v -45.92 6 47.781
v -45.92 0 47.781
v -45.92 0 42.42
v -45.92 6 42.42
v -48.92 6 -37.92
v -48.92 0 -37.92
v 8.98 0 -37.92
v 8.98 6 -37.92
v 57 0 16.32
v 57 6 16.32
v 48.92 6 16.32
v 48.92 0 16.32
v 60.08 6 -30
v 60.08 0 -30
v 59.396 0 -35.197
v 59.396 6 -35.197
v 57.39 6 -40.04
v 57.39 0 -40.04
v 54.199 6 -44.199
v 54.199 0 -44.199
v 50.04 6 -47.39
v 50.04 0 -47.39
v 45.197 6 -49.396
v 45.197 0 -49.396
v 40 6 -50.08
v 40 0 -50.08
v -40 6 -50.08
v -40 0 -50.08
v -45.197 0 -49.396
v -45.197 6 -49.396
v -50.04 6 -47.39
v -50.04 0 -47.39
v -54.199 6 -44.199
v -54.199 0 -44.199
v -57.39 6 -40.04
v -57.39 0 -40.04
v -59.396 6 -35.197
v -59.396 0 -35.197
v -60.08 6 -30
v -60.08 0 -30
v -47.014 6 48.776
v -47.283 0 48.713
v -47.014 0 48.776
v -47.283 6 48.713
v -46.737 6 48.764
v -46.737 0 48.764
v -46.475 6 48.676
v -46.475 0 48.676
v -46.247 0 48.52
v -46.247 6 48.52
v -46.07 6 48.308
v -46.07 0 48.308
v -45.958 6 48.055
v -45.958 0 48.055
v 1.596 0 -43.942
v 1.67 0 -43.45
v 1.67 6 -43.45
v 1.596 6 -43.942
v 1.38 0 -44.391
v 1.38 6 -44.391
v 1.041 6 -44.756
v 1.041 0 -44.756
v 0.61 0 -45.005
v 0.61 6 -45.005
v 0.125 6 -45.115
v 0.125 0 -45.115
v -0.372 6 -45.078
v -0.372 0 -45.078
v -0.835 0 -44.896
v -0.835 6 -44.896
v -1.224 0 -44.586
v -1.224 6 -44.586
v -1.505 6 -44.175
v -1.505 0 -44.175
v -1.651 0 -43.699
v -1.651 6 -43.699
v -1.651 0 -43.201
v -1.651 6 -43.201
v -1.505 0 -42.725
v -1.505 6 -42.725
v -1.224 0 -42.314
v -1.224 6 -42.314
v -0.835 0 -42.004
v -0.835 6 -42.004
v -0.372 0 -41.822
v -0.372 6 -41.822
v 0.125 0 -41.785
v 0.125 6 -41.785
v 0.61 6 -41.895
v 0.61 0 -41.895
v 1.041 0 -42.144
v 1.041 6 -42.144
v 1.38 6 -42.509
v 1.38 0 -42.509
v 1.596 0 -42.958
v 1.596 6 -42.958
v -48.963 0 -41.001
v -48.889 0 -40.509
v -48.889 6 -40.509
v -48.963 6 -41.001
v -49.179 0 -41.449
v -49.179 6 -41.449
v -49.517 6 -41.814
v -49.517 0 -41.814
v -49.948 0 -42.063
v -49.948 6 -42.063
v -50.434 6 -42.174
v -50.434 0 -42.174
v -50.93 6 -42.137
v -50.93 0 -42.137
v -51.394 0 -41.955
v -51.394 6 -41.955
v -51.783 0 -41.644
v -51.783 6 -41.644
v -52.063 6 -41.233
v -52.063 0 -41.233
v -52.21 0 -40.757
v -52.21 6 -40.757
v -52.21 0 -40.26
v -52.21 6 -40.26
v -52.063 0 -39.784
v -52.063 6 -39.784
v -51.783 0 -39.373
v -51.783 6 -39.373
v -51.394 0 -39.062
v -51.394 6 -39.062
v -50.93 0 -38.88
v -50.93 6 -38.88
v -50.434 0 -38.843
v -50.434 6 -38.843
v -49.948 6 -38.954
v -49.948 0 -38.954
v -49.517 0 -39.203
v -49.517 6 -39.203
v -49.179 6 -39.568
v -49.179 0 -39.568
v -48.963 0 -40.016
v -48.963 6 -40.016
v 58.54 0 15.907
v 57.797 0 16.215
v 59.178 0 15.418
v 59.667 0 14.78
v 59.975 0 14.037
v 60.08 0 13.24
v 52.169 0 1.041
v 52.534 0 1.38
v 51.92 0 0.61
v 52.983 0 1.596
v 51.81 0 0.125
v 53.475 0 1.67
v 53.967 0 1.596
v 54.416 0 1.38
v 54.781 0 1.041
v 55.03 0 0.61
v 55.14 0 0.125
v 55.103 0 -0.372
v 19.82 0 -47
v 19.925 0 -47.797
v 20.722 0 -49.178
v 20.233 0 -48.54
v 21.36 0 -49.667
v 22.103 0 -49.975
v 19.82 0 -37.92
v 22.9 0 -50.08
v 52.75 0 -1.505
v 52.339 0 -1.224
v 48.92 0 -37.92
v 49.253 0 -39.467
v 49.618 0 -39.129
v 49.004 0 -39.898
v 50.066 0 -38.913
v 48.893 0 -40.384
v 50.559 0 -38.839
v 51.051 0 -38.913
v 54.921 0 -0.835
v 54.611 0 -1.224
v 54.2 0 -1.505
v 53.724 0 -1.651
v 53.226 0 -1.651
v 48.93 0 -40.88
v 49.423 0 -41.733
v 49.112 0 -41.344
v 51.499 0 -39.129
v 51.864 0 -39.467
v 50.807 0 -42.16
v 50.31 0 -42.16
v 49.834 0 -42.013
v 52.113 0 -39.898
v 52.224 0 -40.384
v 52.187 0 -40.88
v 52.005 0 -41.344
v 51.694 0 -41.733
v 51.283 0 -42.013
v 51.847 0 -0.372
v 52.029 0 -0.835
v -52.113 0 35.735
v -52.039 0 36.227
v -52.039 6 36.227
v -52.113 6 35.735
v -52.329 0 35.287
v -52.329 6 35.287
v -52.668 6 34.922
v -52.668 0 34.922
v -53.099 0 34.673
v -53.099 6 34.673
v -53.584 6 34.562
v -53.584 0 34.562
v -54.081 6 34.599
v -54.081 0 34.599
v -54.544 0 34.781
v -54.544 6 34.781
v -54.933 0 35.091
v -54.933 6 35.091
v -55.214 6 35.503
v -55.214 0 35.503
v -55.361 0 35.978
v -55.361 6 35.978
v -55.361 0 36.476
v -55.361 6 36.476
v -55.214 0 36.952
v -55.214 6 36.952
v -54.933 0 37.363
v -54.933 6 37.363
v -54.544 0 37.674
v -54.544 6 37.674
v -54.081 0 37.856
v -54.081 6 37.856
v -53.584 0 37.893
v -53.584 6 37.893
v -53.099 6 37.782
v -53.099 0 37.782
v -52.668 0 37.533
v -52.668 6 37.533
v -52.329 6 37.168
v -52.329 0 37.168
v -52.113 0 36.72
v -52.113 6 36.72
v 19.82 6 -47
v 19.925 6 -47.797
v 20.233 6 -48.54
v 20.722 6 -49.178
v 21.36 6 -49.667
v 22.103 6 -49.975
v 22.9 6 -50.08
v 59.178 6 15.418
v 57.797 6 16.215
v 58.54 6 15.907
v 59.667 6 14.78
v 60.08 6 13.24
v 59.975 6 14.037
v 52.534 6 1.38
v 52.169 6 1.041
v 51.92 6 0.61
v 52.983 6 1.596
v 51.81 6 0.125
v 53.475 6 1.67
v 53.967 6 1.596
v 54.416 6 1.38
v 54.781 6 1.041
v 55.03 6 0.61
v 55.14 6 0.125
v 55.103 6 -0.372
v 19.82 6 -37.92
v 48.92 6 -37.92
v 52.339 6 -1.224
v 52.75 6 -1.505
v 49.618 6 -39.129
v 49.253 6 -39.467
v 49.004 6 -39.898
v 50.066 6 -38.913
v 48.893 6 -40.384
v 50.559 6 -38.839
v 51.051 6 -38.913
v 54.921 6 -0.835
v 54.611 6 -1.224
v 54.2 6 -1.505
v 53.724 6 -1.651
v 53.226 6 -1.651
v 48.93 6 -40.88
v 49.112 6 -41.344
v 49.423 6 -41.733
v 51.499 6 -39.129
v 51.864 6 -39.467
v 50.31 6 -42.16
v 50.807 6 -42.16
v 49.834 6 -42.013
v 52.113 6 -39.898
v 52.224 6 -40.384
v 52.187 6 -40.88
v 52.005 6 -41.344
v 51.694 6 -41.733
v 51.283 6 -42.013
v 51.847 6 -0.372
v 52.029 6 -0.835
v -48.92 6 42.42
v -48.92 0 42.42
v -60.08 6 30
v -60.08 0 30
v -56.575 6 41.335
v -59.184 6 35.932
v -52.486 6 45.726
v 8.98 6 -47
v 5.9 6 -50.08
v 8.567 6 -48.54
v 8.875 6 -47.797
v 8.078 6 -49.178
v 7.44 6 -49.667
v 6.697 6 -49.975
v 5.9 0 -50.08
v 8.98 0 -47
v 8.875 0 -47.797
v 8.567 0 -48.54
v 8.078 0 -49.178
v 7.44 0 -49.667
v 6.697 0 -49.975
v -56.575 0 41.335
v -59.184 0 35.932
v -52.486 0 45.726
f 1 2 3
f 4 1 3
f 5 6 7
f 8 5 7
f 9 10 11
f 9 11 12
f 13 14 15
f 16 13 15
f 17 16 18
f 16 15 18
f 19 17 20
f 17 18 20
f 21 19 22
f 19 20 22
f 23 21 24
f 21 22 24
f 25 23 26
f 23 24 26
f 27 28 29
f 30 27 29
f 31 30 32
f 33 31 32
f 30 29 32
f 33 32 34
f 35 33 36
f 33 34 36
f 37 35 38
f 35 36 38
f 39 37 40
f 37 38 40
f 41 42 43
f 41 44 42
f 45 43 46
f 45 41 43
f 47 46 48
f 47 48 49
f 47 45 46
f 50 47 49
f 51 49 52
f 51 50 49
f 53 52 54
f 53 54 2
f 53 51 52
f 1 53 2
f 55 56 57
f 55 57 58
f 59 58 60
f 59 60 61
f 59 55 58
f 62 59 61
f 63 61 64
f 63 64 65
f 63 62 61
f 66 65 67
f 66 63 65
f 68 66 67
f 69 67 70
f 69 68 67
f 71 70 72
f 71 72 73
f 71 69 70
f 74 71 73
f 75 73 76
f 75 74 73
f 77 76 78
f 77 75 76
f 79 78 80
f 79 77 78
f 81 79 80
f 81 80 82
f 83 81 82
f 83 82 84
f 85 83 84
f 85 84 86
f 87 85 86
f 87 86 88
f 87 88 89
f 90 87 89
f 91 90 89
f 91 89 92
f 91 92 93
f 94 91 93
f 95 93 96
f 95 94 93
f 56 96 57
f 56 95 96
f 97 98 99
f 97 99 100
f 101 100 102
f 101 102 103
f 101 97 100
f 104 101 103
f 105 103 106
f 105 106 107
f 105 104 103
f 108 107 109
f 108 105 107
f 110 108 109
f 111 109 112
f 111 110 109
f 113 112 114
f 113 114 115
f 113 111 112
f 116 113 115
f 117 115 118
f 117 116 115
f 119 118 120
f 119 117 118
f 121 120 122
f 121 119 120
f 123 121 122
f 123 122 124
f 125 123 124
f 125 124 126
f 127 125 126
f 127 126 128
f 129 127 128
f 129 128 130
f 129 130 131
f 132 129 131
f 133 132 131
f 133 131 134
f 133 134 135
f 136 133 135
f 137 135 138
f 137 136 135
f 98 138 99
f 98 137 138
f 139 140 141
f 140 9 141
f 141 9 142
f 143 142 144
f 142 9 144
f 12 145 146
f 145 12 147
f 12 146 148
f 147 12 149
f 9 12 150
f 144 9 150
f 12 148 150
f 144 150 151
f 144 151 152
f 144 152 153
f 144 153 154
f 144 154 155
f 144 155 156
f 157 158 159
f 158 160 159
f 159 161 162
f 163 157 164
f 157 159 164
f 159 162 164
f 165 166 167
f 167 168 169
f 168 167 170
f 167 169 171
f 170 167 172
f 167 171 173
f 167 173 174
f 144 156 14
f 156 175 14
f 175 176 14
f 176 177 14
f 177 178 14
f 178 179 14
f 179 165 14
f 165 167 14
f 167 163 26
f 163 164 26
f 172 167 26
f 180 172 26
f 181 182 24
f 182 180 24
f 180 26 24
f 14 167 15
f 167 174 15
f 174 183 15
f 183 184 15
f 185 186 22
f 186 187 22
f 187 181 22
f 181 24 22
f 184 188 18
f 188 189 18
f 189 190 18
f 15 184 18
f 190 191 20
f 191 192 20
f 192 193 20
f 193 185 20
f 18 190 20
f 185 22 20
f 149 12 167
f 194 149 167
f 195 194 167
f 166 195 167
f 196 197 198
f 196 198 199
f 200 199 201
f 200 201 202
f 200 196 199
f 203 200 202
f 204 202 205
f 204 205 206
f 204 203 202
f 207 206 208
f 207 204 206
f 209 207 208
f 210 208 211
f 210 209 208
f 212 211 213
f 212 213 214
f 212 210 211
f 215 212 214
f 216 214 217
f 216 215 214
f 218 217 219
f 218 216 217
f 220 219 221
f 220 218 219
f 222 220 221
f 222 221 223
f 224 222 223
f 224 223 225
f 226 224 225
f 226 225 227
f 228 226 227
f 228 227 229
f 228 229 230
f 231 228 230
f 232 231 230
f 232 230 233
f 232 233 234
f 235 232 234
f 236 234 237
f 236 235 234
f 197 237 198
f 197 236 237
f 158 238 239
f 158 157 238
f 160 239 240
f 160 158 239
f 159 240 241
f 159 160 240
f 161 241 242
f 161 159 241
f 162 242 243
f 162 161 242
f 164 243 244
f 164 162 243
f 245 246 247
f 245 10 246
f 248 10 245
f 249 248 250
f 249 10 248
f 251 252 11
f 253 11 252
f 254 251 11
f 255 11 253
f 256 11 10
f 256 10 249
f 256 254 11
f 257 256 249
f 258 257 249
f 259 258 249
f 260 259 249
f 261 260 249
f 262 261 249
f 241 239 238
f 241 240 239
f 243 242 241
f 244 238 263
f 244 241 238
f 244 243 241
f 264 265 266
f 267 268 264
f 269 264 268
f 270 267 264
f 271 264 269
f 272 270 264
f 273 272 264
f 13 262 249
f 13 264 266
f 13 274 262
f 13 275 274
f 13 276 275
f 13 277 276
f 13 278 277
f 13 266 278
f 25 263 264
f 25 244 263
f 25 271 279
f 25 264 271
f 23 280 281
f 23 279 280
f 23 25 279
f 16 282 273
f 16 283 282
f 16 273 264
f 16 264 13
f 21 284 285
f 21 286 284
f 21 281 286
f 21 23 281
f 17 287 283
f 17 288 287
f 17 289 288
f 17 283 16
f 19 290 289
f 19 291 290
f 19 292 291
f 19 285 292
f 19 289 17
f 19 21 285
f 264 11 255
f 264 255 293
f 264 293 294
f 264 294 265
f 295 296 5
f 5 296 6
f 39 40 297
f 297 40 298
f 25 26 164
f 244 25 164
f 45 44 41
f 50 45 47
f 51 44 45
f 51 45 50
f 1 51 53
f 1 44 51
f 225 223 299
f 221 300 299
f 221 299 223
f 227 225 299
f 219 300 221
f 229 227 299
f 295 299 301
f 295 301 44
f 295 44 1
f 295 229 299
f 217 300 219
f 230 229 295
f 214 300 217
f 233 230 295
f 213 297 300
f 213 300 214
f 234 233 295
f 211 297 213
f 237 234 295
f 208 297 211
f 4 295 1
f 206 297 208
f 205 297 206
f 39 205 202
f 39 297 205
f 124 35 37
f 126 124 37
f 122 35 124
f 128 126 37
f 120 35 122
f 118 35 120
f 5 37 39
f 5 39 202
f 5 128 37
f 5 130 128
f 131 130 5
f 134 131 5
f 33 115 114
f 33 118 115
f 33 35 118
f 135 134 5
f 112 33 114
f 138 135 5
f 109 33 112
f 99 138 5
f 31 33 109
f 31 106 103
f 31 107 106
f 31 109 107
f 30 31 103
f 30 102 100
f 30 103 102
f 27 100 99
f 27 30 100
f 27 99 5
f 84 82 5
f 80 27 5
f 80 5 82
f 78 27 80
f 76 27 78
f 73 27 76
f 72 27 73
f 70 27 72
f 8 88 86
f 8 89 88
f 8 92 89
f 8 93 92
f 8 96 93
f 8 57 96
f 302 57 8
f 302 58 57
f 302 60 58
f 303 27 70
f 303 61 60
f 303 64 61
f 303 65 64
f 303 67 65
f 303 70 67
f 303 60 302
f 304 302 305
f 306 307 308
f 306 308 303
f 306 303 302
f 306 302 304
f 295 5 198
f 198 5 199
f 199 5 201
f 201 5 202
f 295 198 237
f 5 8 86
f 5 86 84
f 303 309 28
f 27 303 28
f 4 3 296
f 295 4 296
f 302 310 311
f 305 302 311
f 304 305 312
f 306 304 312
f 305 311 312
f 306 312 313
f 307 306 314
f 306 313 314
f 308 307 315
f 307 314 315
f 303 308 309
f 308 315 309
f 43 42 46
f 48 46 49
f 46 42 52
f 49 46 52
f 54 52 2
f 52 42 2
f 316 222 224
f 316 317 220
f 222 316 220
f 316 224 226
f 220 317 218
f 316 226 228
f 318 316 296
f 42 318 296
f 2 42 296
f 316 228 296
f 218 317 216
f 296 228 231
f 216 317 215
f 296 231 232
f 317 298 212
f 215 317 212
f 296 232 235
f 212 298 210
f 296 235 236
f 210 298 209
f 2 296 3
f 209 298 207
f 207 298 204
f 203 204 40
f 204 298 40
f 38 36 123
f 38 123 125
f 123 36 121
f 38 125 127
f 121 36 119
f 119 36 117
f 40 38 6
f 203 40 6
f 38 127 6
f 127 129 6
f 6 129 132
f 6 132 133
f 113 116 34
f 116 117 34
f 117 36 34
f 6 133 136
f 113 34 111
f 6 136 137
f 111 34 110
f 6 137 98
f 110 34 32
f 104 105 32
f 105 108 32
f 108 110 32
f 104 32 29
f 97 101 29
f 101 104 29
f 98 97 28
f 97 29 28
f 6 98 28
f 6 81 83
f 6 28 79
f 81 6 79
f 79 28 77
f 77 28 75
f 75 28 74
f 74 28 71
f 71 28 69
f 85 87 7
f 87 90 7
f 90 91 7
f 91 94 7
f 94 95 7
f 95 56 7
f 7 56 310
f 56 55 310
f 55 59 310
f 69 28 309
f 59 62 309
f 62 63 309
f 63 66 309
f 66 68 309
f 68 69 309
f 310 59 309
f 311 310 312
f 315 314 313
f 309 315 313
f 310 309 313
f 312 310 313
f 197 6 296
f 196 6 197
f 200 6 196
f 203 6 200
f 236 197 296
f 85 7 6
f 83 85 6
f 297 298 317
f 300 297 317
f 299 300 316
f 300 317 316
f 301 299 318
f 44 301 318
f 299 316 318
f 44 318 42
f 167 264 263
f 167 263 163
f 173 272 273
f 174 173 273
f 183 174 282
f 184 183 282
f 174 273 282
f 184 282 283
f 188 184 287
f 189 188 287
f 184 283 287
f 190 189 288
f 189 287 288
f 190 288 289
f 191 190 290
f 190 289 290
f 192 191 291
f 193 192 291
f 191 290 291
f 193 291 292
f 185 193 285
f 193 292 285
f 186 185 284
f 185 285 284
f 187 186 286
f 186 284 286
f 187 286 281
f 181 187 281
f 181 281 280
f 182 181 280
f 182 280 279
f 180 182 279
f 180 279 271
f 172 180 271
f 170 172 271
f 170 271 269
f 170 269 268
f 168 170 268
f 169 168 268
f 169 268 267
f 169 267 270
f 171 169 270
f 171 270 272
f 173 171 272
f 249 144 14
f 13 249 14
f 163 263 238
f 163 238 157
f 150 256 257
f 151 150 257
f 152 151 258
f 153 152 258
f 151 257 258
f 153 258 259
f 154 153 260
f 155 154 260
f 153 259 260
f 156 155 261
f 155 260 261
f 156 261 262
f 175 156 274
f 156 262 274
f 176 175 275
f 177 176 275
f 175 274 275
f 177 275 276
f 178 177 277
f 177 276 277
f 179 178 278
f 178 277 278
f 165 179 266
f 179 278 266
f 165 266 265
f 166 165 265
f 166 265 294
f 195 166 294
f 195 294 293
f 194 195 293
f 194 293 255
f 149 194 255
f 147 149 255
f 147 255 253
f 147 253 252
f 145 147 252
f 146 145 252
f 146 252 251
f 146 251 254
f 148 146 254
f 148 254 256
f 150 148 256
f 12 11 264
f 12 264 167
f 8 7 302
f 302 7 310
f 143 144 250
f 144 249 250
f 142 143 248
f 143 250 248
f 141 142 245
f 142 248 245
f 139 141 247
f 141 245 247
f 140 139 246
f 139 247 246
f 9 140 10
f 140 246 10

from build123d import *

# Parameters (mm, degrees)
BOSS_EXTRUDE1_DEPTH    = 6
CUT_EXTRUDE1_DEPTH     = 79.33262411
SKETCH3_W              = 25
SKETCH3_H              = 31.620571099
CUT_EXTRUDE2_DEPTH     = 79.33262411
FILLET1_R              = 3
SKETCH4_W              = 11
SKETCH4_H              = 12
CUT_EXTRUDE3_DEPTH     = 79.33262411
FILLET2_R              = 3
FILLET3_R              = 3
SKETCH5_R              = 1.75
CUT_EXTRUDE4_DEPTH     = 79.33262411
MOVE_FACE2_BY          = 0.08
MOVE_FACE2_2_BY        = 0.08
MOVE_FACE2_3_BY        = 0.08
MOVE_FACE2_4_BY        = 0.08
MOVE_FACE2_5_BY        = 0.08
MOVE_FACE2_6_BY        = 0.08
MOVE_FACE2_7_BY        = 0.08
MOVE_FACE2_8_BY        = 0.08
MOVE_FACE2_9_BY        = 0.08
MOVE_FACE2_10_BY       = 0.08
MOVE_FACE2_11_BY       = 0.08
MOVE_FACE3_OUTLINE_R   = 1.75
MOVE_FACE3_OUTLINE_R_2 = 1.67
MOVE_FACE3_DEPTH       = 6
FILLET4_R              = 1


# Read off the part's stored shape, not the designer's step: Move Face3
with BuildPart() as part:
    # Sketch1 → Boss-Extrude1 (new body)
    with BuildSketch(Plane(origin=(0, 0, 0), x_dir=(1, 0, 0), z_dir=(0, 1, 0))):
        with BuildLine():
            Line((-60, 30), (-60, -30))
            ThreePointArc((-60, -30), (-54.142135624, -44.142135624), (-40, -50))
            Line((-40, -50), (40, -50))
            ThreePointArc((40, -50), (54.142135624, -44.142135624), (60, -30))
            Line((60, -30), (60, 30))
            ThreePointArc((60, 30), (54.142135624, 44.142135624), (40, 50))
            Line((40, 50), (-40, 50))
            ThreePointArc((-40, 50), (-54.142135624, 44.142135624), (-60, 30))
        make_face()
    extrude(amount=BOSS_EXTRUDE1_DEPTH)

    # Sketch2 → Cut-Extrude1 (cut, through all)
    with BuildSketch(Plane(origin=(0, 6, 0), x_dir=(1, 0, 0), z_dir=(0, 1, 0))):
        Polygon((-49, 38), (49, 38), (49, -50), (-46, -50), (-46, -42.5), (-49, -42.5), align=None)
    extrude(amount=-CUT_EXTRUDE1_DEPTH, mode=Mode.SUBTRACT)

    # Sketch3 → Cut-Extrude2 (cut, through all)
    with BuildSketch(Plane(origin=(0, 6, 0), x_dir=(1, 0, 0), z_dir=(0, 1, 0))):
        with Locations((61.5, -32.05028555)):
            Rectangle(SKETCH3_W, SKETCH3_H)
    extrude(amount=-CUT_EXTRUDE2_DEPTH, mode=Mode.SUBTRACT)

    # Fillet1
    fillet1_edges = [part.edges().sort_by_distance(p)[0] for p in [
        (60, 3, 16.24),
    ]]
    fillet(fillet1_edges, radius=FILLET1_R)

    # Sketch4 → Cut-Extrude3 (cut, through all)
    with BuildSketch(Plane(origin=(0, 6, 0), x_dir=(1, 0, 0), z_dir=(0, 1, 0))):
        with Locations((14.4, 44)):
            Rectangle(SKETCH4_W, SKETCH4_H)
    extrude(amount=-CUT_EXTRUDE3_DEPTH, mode=Mode.SUBTRACT)


with BuildPart() as cut_extrude3_piece_1:
    # of the separate pieces the step leaves, piece 1, a body of its own (cut_extrude3_pieces)
    add(part.part.solids().sort_by_distance((8.9, 0, -50))[0])

    # Fillet2
    fillet2_edges = [cut_extrude3_piece_1.edges().sort_by_distance(p)[0] for p in [
        (8.9, 3, -50),
    ]]
    fillet(fillet2_edges, radius=FILLET2_R)


with BuildPart() as cut_extrude3_piece_2:
    # of the separate pieces the step leaves, piece 2, a body of its own (cut_extrude3_pieces)
    add(part.part.solids().sort_by_distance((60, 0, 13.24))[0])

    # Fillet3
    fillet3_edges = [cut_extrude3_piece_2.edges().sort_by_distance(p)[0] for p in [
        (19.9, 3, -50),
    ]]
    fillet(fillet3_edges, radius=FILLET3_R)


with BuildPart() as cut_extrude4_tool:
    # Sketch5 → Cut-Extrude4 (new, through all)
    with BuildSketch(Plane(origin=(0, 6, 0), x_dir=(1, 0, 0), z_dir=(0, 1, 0))):
        with Locations(Location((53.475, 0, 0), (0, 0, 270))):
            Circle(SKETCH5_R)
        with Locations(Location((-53.709292606, -36.227375296, 0), (0, 0, 270))):
            Circle(SKETCH5_R)
        with Locations(Location((0, 43.45, 0), (0, 0, 270))):
            Circle(SKETCH5_R)
        with Locations(Location((50.558556763, 40.508556763, 0), (0, 0, 270))):
            Circle(SKETCH5_R)
        with Locations(Location((-50.558556763, 40.508556763, 0), (0, 0, 90))):
            Circle(SKETCH5_R)
    extrude(amount=-CUT_EXTRUDE4_DEPTH)


with BuildPart() as cut_extrude3_piece_1_1:
    add(cut_extrude3_piece_1.part)

    # Cut-Extrude4: cut by cut_extrude4_tool
    add(cut_extrude4_tool.part, mode=Mode.SUBTRACT)

    # Move Face3 outline → Move Face3 (add)
    # profile 1 of 4: a face of its own
    with BuildSketch(Plane(origin=(0, 0, 0), x_dir=(1, 0, 0), z_dir=(0, 1, 0))):
        with BuildLine():
            Line((5.9, 50.08), (-40, 50.08))
            ThreePointArc((-40, 50.08), (-54.198704166, 44.198704166), (-60.08, 30))
            Line((-60.08, 30), (-60.08, -30))
            ThreePointArc((-60.08, -30), (-56.156732343, -41.923355232), (-45.92, -49.187495928))
            Line((-45.92, -49.187495928), (-45.92, -42.42))
            Line((-45.92, -42.42), (-48.92, -42.42))
            Line((-48.92, -42.42), (-48.92, 37.92))
            Line((-48.92, 37.92), (8.98, 37.92))
            Line((8.98, 37.92), (8.98, 47))
            ThreePointArc((8.98, 47), (8.077888886, 49.177888886), (5.9, 50.08))
        make_face()
        with BuildLine():
            Line((-60, -30), (-60, 30))
            ThreePointArc((-60, 30), (-54.142135624, 44.142135624), (-40, 50))
            Line((-40, 50), (5.9, 50))
            ThreePointArc((5.9, 50), (8.021320344, 49.121320344), (8.9, 47))
            Line((8.9, 47), (8.9, 38))
            Line((8.9, 38), (-49, 38))
            Line((-49, 38), (-49, -42.5))
            Line((-49, -42.5), (-46, -42.5))
            Line((-46, -42.5), (-46, -49.078784028))
            ThreePointArc((-46, -49.078784028), (-56.124515497, -41.832159566), (-60, -30))
        make_face(mode=Mode.SUBTRACT)
    # profile 2 of 4: a face of its own
    with BuildSketch(Plane(origin=(0, 0, 0), x_dir=(1, 0, 0), z_dir=(0, 1, 0))):
        with Locations((-53.709292606, -36.227375296)):
            Circle(MOVE_FACE3_OUTLINE_R)
        with Locations((-53.709292606, -36.227375296)):
            Circle(MOVE_FACE3_OUTLINE_R_2, mode=Mode.SUBTRACT)
    # profile 3 of 4: a face of its own
    with BuildSketch(Plane(origin=(0, 0, 0), x_dir=(1, 0, 0), z_dir=(0, 1, 0))):
        with Locations((-50.558556763, 40.508556763)):
            Circle(MOVE_FACE3_OUTLINE_R)
        with Locations((-50.558556763, 40.508556763)):
            Circle(MOVE_FACE3_OUTLINE_R_2, mode=Mode.SUBTRACT)
    # profile 4 of 4: a face of its own
    with BuildSketch(Plane(origin=(0, 0, 0), x_dir=(1, 0, 0), z_dir=(0, 1, 0))):
        with Locations((0, 43.45)):
            Circle(MOVE_FACE3_OUTLINE_R)
        with Locations((0, 43.45)):
            Circle(MOVE_FACE3_OUTLINE_R_2, mode=Mode.SUBTRACT)
    extrude(amount=MOVE_FACE3_DEPTH)

    # Fillet4
    fillet4_edges = [cut_extrude3_piece_1_1.edges().sort_by_distance(p)[0] for p in [
        (-45.92, 3, 49.187495928),
    ]]
    fillet(fillet4_edges, radius=FILLET4_R)


with BuildPart() as cut_extrude3_piece_2_1:
    add(cut_extrude3_piece_2.part)

    # Cut-Extrude4: cut by cut_extrude4_tool
    add(cut_extrude4_tool.part, mode=Mode.SUBTRACT)

    # Move Face2: a curved face moved outward by 0.08
    add(Solid.thicken(cut_extrude3_piece_2_1.faces().sort_by_distance((50.558556763, 3, -42.258556763))[0], MOVE_FACE2_BY))

    # Move Face2 2: a curved face moved outward by 0.08
    add(Solid.thicken(cut_extrude3_piece_2_1.faces().sort_by_distance((53.475, 3, -1.75))[0], MOVE_FACE2_2_BY))

    # Move Face2 3: a face moved outward by 0.08
    extrude(cut_extrude3_piece_2_1.faces().sort_by_distance((19.9, 3, -42.5))[0], amount=MOVE_FACE2_3_BY, dir=(-1, 0, 0))

    # Move Face2 4: a curved face moved outward by 0.08
    add(Solid.thicken(cut_extrude3_piece_2_1.faces().sort_by_distance((20.778679656, 3, -49.121320344))[0], MOVE_FACE2_4_BY))

    # Move Face2 5: a face moved outward by 0.08
    extrude(cut_extrude3_piece_2_1.faces().sort_by_distance((31.45, 3, -50))[0], amount=MOVE_FACE2_5_BY, dir=(0, 0, -1))

    # Move Face2 6: a curved face moved outward by 0.08
    add(Solid.thicken(cut_extrude3_piece_2_1.faces().sort_by_distance((54.142135624, 3, -44.142135624))[0], MOVE_FACE2_6_BY))

    # Move Face2 7: a face moved outward by 0.08
    extrude(cut_extrude3_piece_2_1.faces().sort_by_distance((60, 3, -8.38))[0], amount=MOVE_FACE2_7_BY, dir=(1, 0, 0))

    # Move Face2 8: a curved face moved outward by 0.08
    add(Solid.thicken(cut_extrude3_piece_2_1.faces().sort_by_distance((59.121320344, 3, 15.361320344))[0], MOVE_FACE2_8_BY))

    # Move Face2 9: a face moved outward by 0.08
    extrude(cut_extrude3_piece_2_1.faces().sort_by_distance((49, 3, -10.88))[0], amount=MOVE_FACE2_9_BY, dir=(-1, 0, 0))

    # Move Face2 10: a face moved outward by 0.08
    extrude(cut_extrude3_piece_2_1.faces().sort_by_distance((34.45, 3, -38))[0], amount=MOVE_FACE2_10_BY, dir=(0, 0, 1))

    # Move Face2 11: a face moved outward by 0.08
    extrude(cut_extrude3_piece_2_1.faces().sort_by_distance((53, 3, 16.24))[0], amount=MOVE_FACE2_11_BY, dir=(0, 0, 1))


solid = Compound([cut_extrude3_piece_1_1.part, cut_extrude3_piece_2_1.part])
